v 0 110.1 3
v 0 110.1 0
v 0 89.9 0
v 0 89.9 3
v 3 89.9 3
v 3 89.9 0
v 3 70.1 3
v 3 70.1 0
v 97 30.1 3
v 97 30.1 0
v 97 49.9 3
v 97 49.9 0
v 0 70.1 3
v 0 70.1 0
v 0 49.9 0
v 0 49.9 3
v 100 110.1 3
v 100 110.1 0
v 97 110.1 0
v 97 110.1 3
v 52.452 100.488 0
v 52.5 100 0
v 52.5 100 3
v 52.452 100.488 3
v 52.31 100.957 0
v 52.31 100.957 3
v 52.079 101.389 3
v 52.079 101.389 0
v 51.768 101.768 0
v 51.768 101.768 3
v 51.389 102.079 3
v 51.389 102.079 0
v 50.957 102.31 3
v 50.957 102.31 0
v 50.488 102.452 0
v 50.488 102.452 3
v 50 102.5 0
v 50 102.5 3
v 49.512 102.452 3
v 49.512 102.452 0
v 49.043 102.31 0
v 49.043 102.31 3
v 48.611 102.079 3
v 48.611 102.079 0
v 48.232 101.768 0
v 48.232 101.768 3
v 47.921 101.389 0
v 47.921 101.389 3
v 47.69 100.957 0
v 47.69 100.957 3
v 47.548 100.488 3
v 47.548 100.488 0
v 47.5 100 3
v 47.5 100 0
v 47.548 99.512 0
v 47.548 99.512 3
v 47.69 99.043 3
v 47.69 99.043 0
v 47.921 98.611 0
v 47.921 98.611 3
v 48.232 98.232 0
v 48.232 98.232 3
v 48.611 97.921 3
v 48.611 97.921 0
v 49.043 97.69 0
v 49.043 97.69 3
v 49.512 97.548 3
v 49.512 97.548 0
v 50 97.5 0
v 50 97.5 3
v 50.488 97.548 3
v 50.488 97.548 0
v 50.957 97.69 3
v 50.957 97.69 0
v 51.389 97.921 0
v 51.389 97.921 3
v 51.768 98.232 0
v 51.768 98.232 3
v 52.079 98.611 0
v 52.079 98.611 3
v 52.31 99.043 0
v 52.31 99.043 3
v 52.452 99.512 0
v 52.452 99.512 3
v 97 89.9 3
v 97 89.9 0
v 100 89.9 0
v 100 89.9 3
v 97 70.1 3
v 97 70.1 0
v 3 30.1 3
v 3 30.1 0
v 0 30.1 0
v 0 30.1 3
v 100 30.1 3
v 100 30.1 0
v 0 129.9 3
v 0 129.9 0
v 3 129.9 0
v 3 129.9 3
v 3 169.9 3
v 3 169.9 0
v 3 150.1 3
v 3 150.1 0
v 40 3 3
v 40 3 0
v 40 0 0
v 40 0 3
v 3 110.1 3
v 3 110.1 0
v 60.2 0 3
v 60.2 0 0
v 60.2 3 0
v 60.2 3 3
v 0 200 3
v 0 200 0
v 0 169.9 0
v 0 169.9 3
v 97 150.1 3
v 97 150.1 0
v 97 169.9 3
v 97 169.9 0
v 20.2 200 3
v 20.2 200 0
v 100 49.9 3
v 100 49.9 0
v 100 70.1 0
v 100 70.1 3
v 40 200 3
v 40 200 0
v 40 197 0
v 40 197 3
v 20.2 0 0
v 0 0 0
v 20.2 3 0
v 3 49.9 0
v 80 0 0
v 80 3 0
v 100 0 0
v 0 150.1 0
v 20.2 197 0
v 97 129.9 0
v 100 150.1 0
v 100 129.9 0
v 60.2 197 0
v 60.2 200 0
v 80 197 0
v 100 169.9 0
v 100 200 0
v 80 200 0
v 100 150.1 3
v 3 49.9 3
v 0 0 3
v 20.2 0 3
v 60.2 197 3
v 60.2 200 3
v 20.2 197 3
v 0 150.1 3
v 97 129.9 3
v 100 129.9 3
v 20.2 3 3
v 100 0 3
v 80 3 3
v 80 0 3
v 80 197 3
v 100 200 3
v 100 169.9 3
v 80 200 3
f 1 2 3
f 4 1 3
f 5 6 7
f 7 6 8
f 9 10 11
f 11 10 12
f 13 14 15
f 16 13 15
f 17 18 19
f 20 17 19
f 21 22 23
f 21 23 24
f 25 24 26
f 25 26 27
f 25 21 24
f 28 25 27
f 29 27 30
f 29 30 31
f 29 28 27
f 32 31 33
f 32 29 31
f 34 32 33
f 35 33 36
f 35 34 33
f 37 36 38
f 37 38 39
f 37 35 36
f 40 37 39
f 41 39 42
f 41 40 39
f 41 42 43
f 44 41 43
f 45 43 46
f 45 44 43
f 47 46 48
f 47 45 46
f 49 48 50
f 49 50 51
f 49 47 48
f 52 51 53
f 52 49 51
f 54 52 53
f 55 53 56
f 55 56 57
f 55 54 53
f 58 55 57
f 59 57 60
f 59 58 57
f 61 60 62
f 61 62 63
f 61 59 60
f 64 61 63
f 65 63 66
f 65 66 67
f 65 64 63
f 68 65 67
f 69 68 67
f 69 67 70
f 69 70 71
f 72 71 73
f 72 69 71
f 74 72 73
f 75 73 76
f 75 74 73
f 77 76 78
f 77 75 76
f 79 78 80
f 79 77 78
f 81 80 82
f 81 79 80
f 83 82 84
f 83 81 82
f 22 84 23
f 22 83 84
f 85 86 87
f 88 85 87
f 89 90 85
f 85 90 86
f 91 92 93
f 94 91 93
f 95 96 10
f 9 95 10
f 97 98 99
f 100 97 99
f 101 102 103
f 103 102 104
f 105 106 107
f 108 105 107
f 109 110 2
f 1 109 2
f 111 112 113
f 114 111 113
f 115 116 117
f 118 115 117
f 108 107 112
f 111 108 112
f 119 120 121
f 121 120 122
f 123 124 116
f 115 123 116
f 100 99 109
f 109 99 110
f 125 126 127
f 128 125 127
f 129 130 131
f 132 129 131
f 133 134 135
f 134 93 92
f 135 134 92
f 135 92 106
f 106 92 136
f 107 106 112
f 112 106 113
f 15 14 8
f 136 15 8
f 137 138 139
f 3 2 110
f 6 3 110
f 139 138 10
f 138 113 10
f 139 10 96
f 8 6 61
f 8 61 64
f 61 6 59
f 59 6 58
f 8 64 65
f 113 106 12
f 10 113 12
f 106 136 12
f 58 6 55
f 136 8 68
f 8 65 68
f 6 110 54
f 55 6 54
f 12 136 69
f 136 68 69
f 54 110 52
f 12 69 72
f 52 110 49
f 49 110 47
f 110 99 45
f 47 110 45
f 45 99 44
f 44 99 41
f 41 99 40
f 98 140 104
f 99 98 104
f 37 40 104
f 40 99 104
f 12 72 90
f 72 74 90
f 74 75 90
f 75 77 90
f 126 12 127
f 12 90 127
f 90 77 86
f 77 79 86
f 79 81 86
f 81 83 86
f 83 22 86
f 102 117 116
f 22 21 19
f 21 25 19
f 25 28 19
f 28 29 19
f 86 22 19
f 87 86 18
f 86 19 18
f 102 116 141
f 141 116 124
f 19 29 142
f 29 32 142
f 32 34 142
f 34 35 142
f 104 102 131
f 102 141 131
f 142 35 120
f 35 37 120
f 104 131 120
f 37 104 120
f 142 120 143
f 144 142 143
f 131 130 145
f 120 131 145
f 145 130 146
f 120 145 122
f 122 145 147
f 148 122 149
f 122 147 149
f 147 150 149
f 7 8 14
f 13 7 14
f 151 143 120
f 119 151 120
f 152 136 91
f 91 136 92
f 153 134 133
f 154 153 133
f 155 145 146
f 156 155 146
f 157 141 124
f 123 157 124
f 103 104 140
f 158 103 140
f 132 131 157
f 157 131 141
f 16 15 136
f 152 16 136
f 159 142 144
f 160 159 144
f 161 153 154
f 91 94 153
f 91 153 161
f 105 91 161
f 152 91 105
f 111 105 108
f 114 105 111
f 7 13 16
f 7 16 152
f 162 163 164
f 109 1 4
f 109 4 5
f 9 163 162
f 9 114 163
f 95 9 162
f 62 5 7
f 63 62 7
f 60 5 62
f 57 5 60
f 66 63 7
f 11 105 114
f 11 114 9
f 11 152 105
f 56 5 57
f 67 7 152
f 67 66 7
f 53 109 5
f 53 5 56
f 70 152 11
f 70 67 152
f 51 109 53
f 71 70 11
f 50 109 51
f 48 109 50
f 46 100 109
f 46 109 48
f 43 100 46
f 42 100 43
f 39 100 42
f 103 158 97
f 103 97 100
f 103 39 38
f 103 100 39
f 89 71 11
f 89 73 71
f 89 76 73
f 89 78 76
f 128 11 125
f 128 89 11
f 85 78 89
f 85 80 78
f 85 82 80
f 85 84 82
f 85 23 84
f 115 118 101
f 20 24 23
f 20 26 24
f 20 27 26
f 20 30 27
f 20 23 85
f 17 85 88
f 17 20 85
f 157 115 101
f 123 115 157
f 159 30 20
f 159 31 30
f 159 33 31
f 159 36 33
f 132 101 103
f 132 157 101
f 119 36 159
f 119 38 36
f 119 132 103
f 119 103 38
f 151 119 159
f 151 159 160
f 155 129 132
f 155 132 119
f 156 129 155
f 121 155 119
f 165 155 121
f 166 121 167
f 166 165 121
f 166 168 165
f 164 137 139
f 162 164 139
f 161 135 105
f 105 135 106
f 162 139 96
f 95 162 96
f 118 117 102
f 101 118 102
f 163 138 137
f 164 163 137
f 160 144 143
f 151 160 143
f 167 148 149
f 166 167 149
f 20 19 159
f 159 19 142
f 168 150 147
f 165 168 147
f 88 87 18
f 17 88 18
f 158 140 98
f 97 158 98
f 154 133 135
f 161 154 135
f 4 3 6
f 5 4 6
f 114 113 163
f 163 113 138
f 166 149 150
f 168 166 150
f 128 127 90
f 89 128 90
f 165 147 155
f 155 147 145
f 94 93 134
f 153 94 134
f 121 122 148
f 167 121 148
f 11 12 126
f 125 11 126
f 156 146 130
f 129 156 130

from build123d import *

# Parameters (mm, degrees)
SKETCH1_R           = 2.5
BOSS_EXTRUDE1_DEPTH = 3


with BuildPart() as part:
    # Sketch1 → Boss-Extrude1 (new body)
    with BuildSketch(Plane.XY):
        Polygon((60.2, 197), (60.2, 200), (40, 200), (40, 197), (20.2, 197), (20.2, 200), (0, 200), (0, 169.9), (3, 169.9), (3, 150.1), (0, 150.1), (0, 129.9), (3, 129.9), (3, 110.1), (0, 110.1), (0, 89.9), (3, 89.9), (3, 70.1), (0, 70.1), (0, 49.9), (3, 49.9), (3, 30.1), (0, 30.1), (0, 0), (20.2, 0), (20.2, 3), (40, 3), (40, 0), (60.2, 0), (60.2, 3), (80, 3), (80, 0), (100, 0), (100, 30.1), (97, 30.1), (97, 49.9), (100, 49.9), (100, 70.1), (97, 70.1), (97, 89.9), (100, 89.9), (100, 110.1), (97, 110.1), (97, 129.9), (100, 129.9), (100, 150.1), (97, 150.1), (97, 169.9), (100, 169.9), (100, 200), (80, 200), (80, 197), align=None)
        with Locations((50, 100)):
            Circle(SKETCH1_R, mode=Mode.SUBTRACT)
    extrude(amount=BOSS_EXTRUDE1_DEPTH)


solid = part.part
